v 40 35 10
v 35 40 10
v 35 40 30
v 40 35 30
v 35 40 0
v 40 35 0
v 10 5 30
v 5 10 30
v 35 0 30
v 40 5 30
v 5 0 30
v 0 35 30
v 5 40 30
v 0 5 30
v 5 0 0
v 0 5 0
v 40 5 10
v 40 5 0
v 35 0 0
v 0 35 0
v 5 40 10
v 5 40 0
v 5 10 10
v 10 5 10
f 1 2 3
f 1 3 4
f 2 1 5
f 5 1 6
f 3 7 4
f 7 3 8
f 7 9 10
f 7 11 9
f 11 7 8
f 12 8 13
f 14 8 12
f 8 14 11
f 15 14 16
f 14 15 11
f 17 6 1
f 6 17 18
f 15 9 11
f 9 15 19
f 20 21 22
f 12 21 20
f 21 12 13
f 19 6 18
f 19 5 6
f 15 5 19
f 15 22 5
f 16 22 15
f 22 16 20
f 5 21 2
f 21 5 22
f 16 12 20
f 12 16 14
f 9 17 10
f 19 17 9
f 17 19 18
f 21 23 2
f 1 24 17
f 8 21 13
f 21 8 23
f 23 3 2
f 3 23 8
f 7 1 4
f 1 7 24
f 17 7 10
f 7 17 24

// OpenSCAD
W = 40;
D = 40;
H = 30;
C = 5;

difference () {
    linear_extrude(H)
        polygon([[C, 0], [W - C, 0],
                [W, C], [W, D - C],
                [W - C, D], [C, D],
                [0, D - C], [0, C]]);
    translate([0, 0, C * 2]) {
        linear_extrude(H - C * 2) {
            polygon([[C, C * 2], [C, D], [W - C, D]]);
            polygon([[C * 2, C], [W, D - C], [W, C]]);
        }
    }
}
